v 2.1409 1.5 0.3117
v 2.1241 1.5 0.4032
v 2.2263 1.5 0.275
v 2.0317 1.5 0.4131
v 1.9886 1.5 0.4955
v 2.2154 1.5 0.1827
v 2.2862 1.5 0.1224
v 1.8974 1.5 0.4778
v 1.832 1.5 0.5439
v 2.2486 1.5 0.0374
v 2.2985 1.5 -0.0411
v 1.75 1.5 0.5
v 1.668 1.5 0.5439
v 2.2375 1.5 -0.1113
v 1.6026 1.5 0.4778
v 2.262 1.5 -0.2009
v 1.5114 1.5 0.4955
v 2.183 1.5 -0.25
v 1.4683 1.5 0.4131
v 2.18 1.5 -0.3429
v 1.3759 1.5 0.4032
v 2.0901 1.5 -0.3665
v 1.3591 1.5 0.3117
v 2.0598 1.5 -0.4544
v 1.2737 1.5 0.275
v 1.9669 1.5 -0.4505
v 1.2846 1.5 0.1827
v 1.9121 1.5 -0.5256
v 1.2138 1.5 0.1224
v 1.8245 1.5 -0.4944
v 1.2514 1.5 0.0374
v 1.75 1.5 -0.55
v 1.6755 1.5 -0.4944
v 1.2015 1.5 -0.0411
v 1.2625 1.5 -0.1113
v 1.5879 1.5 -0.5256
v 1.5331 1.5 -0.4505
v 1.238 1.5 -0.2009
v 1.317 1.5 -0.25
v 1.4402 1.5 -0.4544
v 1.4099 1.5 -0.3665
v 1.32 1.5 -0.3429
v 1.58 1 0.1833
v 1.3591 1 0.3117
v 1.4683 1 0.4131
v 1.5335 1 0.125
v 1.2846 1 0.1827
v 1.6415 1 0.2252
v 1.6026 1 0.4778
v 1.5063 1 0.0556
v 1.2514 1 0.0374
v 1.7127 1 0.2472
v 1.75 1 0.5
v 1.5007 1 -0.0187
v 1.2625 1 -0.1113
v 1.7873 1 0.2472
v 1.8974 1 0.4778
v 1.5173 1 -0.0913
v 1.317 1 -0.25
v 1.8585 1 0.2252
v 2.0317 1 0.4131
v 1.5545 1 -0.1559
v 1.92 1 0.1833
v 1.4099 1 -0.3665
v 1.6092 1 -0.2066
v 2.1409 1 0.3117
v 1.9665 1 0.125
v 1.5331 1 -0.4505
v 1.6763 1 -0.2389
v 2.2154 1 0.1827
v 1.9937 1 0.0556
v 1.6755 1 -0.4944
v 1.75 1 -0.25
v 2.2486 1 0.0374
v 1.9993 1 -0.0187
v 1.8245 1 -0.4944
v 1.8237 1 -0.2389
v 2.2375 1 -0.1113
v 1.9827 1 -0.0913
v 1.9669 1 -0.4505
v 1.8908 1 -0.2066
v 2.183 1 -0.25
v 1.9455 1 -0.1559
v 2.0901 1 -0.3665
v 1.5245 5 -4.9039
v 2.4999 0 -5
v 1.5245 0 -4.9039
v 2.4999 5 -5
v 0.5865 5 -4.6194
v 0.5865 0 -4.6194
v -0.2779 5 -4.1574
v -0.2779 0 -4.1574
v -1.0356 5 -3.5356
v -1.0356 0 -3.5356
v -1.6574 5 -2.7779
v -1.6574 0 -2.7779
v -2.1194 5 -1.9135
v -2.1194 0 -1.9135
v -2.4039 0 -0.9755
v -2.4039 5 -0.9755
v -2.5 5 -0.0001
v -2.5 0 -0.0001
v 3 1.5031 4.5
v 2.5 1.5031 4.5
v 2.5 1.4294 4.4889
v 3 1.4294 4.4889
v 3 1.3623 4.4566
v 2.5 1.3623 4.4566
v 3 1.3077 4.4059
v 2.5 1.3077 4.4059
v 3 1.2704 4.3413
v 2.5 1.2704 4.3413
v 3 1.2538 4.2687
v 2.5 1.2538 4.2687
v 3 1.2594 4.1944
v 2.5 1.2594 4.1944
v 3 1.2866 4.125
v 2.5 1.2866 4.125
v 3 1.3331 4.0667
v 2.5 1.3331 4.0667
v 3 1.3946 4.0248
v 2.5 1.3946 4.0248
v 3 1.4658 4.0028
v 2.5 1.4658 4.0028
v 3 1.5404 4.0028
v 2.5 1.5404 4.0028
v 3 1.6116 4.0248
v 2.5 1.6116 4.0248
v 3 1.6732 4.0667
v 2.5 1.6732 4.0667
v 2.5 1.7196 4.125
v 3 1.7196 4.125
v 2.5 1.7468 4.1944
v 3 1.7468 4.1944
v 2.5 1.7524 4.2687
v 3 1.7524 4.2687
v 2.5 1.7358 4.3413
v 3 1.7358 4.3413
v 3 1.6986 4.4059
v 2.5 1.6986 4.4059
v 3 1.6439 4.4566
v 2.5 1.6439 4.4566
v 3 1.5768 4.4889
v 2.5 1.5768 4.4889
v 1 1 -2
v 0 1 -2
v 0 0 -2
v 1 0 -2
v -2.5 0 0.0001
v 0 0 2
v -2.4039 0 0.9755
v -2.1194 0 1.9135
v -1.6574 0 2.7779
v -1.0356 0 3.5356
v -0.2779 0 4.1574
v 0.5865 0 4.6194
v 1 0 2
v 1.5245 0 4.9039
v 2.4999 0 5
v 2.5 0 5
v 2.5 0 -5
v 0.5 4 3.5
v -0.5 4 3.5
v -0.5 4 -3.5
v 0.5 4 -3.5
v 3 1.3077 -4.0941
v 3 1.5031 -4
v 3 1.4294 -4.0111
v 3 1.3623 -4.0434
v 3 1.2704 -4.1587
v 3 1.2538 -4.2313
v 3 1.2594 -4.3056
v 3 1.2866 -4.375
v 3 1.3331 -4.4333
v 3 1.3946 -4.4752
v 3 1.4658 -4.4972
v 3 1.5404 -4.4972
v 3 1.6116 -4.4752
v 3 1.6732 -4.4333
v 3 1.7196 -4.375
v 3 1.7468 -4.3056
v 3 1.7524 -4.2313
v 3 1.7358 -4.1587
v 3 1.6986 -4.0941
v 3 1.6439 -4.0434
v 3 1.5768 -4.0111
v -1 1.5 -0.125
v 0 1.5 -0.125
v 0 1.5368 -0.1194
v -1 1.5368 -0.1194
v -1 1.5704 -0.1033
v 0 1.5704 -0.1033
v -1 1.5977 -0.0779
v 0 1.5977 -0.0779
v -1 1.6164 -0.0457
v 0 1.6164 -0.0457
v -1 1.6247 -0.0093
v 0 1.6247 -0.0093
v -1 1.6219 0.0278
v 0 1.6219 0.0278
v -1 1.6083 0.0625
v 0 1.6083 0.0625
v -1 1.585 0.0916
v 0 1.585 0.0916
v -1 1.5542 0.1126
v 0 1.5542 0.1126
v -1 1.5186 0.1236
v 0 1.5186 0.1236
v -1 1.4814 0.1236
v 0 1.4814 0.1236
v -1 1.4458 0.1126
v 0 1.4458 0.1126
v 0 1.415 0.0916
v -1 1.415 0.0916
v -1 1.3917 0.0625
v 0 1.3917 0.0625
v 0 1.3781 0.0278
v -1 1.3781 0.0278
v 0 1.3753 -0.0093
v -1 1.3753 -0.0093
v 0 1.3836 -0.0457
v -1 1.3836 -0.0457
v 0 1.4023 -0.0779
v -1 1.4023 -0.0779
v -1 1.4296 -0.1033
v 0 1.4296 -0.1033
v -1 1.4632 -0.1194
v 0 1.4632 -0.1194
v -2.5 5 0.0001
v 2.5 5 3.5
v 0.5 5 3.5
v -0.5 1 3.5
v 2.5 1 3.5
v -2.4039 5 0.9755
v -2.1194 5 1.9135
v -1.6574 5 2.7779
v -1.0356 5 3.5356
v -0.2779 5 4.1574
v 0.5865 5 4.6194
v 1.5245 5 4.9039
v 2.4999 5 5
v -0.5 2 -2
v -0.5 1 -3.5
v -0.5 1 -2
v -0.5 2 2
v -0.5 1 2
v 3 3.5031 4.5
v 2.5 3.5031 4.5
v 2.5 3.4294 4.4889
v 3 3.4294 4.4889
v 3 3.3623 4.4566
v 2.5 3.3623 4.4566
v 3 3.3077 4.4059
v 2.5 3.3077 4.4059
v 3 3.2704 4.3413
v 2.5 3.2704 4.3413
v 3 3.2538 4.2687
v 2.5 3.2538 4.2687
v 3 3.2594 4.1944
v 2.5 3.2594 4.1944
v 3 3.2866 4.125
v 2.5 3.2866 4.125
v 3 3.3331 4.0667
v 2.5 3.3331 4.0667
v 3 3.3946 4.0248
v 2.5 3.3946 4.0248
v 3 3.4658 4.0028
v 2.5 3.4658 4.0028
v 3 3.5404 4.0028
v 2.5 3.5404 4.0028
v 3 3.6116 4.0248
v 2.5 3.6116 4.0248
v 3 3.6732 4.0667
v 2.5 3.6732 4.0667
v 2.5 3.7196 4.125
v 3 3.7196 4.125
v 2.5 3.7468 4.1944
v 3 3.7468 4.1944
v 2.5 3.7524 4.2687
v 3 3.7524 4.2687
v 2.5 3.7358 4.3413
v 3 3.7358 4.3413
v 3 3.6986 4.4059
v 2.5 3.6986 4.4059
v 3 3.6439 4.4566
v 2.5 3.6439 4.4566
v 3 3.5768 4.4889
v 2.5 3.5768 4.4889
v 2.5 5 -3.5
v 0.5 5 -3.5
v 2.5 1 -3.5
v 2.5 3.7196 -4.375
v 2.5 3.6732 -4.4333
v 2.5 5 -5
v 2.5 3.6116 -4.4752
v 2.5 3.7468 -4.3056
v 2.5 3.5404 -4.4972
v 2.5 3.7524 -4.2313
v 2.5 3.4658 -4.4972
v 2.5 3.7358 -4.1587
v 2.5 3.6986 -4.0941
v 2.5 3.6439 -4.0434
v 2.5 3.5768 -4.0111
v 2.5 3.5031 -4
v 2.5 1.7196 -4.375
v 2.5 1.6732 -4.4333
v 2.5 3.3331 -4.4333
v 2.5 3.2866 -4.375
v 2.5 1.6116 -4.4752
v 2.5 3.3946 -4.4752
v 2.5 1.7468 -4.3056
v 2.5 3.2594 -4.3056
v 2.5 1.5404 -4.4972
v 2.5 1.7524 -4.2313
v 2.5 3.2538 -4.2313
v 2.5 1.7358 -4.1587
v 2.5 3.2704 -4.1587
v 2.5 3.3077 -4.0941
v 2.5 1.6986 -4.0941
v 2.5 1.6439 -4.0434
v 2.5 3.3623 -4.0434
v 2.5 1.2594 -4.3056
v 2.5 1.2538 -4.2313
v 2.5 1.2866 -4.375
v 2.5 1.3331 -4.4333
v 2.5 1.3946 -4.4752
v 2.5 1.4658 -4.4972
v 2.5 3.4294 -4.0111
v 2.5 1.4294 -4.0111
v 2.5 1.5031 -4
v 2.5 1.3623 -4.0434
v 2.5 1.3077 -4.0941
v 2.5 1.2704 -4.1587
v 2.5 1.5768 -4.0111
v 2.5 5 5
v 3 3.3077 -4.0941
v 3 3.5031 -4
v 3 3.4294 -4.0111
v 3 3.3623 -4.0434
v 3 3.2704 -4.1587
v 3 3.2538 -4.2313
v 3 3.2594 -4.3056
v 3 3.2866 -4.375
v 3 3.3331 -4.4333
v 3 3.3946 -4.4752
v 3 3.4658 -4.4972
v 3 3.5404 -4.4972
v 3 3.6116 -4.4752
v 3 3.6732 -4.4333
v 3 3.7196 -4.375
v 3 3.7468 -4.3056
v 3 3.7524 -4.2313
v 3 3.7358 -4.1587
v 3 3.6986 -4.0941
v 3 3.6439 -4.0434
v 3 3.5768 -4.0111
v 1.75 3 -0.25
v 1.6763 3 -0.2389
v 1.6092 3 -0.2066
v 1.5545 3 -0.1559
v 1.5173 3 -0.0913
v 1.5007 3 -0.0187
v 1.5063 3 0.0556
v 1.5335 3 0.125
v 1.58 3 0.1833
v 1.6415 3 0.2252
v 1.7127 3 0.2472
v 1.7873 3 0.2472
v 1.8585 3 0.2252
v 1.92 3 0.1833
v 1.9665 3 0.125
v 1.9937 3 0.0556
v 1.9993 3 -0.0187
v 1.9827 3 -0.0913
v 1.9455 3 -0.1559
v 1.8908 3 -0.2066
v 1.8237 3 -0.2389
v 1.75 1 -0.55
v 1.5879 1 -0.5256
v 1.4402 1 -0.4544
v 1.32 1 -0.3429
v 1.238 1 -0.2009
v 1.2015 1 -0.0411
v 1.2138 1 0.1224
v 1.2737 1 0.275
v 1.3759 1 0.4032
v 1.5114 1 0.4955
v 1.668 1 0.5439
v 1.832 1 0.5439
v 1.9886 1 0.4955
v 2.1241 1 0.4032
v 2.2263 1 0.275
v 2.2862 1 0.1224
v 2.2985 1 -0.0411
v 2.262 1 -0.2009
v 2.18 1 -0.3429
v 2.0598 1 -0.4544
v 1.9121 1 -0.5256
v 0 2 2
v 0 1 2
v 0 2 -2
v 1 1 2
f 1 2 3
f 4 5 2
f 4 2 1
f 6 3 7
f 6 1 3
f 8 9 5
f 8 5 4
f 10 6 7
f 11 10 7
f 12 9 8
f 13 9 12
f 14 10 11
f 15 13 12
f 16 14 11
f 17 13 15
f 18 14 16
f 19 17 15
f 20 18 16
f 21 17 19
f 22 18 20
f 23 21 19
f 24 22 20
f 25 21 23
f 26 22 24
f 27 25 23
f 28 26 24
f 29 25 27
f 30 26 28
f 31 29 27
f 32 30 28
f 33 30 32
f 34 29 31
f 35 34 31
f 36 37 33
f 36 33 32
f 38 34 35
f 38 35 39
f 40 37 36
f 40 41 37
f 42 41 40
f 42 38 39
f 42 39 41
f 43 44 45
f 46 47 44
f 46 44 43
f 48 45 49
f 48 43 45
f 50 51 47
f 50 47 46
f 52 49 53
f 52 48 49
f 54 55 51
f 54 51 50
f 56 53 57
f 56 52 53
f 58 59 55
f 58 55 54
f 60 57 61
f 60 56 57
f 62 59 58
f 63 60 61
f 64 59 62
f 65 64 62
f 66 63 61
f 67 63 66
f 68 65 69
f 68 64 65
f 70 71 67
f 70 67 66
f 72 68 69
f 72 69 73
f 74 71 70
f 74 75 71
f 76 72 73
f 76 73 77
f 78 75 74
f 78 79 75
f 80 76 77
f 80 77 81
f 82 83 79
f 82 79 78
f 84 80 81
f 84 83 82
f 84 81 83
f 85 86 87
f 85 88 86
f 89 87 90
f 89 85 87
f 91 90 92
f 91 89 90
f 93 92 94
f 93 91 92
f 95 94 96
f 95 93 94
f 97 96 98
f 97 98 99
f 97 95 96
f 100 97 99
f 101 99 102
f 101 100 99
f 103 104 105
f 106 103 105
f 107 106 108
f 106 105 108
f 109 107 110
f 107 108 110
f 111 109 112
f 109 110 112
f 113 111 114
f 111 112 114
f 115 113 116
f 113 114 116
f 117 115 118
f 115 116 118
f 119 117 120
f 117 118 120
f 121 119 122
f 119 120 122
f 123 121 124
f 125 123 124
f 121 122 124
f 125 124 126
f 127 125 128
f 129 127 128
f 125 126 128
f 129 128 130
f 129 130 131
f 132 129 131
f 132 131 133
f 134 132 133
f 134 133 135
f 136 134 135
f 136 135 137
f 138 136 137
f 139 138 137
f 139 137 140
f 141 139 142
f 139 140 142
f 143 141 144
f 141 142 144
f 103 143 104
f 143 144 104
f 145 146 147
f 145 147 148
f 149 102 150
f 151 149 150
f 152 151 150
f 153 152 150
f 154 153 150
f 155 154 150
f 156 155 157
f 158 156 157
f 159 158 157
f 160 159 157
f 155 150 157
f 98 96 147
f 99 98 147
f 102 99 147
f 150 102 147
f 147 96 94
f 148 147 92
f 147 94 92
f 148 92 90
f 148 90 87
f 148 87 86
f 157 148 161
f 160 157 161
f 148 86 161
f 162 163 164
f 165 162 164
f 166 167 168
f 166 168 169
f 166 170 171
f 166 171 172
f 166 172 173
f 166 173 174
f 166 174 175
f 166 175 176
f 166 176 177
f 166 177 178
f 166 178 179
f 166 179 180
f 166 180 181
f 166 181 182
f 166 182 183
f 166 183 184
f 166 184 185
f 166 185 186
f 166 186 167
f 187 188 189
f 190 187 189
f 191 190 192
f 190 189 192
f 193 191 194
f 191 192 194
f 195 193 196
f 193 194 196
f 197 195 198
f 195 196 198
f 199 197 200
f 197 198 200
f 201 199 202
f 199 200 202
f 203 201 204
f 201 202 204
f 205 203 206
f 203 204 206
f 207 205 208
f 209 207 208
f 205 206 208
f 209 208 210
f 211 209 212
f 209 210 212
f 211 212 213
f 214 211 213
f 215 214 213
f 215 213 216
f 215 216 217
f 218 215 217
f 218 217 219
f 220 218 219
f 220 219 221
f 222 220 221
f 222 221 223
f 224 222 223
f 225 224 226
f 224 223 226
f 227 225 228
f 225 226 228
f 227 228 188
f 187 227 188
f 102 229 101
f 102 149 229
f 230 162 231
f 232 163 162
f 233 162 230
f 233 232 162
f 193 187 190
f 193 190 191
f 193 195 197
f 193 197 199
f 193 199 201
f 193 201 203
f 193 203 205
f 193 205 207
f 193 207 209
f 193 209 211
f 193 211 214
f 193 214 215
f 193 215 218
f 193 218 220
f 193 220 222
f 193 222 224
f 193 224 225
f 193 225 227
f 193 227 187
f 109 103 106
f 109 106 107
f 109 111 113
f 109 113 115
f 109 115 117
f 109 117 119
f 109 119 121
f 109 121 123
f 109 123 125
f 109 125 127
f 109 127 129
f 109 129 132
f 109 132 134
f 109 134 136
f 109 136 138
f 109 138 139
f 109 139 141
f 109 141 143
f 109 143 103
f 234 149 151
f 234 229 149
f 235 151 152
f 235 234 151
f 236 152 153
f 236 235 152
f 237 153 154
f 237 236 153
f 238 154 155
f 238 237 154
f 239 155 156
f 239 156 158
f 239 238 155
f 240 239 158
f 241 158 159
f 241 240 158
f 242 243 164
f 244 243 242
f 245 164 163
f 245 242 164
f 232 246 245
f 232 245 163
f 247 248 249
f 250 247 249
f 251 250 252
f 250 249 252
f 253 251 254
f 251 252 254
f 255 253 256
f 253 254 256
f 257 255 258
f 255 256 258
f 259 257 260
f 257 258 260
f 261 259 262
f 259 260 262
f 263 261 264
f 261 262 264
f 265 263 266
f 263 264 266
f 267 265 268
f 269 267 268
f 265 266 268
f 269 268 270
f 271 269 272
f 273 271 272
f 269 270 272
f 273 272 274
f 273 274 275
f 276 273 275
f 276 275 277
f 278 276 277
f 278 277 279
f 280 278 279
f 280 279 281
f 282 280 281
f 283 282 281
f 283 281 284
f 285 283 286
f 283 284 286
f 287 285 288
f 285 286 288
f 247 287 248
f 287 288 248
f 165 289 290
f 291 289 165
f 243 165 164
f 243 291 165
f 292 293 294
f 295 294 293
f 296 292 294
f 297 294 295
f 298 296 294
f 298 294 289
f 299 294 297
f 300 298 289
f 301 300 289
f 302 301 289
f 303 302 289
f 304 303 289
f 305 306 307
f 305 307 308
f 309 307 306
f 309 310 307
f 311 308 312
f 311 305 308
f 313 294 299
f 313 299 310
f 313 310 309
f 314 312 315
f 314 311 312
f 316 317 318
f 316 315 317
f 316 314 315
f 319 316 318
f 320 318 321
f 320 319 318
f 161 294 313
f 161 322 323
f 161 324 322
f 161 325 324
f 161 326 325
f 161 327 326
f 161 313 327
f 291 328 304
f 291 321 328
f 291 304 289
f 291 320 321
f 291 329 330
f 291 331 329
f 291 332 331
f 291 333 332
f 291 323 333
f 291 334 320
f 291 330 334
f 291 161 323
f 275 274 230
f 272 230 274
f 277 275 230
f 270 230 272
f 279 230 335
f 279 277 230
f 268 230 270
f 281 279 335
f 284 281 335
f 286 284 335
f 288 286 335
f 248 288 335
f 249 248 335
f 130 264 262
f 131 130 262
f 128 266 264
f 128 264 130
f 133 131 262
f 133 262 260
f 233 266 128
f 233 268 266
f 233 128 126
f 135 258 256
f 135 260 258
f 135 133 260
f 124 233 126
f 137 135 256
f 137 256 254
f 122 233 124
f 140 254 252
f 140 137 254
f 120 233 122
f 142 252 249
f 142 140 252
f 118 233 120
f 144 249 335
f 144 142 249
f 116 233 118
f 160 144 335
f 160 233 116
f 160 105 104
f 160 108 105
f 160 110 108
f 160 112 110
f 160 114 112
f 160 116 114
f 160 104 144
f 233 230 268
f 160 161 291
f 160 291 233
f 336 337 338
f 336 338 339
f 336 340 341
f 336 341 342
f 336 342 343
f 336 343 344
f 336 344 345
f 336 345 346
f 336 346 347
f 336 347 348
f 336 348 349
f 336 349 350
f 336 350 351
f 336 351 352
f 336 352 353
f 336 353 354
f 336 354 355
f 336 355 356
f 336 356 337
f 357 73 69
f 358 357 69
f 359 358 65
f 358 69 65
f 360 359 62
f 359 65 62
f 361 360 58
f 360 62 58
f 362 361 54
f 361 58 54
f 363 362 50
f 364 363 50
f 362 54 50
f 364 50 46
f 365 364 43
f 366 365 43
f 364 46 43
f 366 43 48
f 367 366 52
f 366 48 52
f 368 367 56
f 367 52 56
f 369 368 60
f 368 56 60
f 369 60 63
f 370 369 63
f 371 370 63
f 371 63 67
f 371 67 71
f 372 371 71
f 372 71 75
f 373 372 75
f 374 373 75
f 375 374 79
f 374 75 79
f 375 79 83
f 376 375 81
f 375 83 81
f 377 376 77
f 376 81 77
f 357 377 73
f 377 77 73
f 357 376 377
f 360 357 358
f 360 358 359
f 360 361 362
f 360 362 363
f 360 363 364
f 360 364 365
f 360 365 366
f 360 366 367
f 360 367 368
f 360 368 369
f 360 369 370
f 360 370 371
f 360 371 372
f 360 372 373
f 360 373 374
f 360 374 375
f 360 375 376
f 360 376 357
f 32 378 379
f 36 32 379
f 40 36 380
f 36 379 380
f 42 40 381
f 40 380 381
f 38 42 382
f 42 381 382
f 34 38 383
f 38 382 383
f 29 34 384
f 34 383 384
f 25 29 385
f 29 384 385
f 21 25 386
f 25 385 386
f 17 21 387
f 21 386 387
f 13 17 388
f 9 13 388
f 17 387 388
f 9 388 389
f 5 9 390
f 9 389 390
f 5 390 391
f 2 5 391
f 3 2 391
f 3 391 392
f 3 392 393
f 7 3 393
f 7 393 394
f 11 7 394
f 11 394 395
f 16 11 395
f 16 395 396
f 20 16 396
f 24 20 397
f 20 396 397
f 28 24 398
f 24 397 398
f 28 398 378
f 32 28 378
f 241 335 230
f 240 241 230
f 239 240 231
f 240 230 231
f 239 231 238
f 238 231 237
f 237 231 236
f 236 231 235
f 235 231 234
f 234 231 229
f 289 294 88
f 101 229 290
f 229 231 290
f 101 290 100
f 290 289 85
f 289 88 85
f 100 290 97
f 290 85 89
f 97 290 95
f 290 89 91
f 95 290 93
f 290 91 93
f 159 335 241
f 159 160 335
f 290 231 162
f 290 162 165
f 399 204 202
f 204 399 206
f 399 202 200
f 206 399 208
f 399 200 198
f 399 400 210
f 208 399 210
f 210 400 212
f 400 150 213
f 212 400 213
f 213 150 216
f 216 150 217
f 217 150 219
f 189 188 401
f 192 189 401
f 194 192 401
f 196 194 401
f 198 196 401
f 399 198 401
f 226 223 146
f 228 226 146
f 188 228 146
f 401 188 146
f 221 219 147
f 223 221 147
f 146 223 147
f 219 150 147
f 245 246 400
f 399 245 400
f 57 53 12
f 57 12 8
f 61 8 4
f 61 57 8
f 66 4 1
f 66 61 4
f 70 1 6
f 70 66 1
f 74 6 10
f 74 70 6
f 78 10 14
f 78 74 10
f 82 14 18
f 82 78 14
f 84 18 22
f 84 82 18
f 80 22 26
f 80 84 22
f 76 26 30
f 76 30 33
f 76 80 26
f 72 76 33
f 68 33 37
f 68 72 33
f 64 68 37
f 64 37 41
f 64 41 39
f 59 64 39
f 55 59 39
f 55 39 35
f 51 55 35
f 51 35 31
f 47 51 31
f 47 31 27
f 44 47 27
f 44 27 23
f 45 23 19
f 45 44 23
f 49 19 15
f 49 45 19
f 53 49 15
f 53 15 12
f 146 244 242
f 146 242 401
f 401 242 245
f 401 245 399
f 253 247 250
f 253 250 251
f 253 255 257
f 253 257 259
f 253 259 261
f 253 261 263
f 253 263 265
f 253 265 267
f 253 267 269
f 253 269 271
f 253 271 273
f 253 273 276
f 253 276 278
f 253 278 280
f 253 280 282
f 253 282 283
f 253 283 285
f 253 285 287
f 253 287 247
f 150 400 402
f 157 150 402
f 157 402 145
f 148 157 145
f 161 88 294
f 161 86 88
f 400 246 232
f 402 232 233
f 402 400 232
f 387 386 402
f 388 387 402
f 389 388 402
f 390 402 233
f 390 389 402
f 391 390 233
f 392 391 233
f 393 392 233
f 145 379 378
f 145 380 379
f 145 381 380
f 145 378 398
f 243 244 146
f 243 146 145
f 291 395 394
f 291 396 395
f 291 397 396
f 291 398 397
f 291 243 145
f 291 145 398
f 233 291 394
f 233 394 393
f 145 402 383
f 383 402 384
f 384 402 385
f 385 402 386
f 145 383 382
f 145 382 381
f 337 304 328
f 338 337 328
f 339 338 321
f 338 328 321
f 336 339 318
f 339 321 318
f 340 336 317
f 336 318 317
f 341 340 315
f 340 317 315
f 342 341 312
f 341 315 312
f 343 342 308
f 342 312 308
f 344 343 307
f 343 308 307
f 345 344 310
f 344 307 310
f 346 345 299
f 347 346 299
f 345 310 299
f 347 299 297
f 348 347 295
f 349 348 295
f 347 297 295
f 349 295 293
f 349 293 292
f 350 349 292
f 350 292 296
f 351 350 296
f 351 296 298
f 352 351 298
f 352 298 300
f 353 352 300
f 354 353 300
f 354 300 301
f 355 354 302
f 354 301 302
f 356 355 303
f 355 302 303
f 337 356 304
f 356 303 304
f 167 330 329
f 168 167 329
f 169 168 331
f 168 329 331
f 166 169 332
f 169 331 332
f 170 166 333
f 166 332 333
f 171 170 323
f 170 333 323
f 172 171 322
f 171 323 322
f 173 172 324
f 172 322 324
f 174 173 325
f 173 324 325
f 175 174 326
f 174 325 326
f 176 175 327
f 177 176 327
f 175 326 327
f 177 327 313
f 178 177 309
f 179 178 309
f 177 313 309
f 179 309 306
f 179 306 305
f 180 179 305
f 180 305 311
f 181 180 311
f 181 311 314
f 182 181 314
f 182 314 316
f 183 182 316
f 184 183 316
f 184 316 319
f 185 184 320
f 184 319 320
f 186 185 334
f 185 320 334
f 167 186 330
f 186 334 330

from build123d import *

# Parameters (mm, degrees)
SZKIC1_W                     = 5
SZKIC1_H                     = 10
DODANIE_WYCI_GNI_CIE1_DEPTH  = 1
DODANIE_WYCI_GNI_CIE4_DEPTH  = 4
ZAOKR_GLENIE2_R              = 5
SZKIC3_W                     = 1
SZKIC3_H                     = 4
WYTNIJ_WYCI_GNI_CIE1_DEPTH   = 4
SZKIC4_W                     = 0.5
SZKIC4_H                     = 4
DODANIE_WYCI_GNI_CIE5_DEPTH  = 1
SZKIC5_R                     = 0.25
DODANIE_WYCI_GNI_CIE6_DEPTH  = 2
SZKIC6_R                     = 0.55
SZKIC6_R_2                   = 0.5
DODANIE_WYCI_GNI_CIE7_DEPTH  = 0.5
SZKIC7_W                     = 7
SZKIC7_H                     = 1
DODANIE_WYCI_GNI_CIE8_DEPTH  = 1
SZKIC11_R                    = 0.25
DODANIE_WYCI_GNI_CIE10_DEPTH = 0.5
SZKIC12_R                    = 0.125
WYTNIJ_WYCI_GNI_CIE2_DEPTH   = 1


with BuildPart() as part:
    # Szkic1 → Dodanie-wyciągnięcie1 (new body)
    with BuildSketch(Plane(origin=(0, 0, 0), x_dir=(1, 0, 0), z_dir=(0, 1, 0))):
        Rectangle(SZKIC1_W, SZKIC1_H)
    extrude(amount=DODANIE_WYCI_GNI_CIE1_DEPTH)

    # Szkic2 → Dodanie-wyciągnięcie4 (add)
    with BuildSketch(Plane(origin=(0, 1, 0), x_dir=(1, 0, 0), z_dir=(0, 1, 0))):
        Polygon((-2.5, 5), (2.5, 5), (2.5, 3.5), (-0.5, 3.5), (-0.5, -3.5), (2.5, -3.5), (2.5, -5), (-2.5, -5), align=None)
    extrude(amount=DODANIE_WYCI_GNI_CIE4_DEPTH)

    # Zaokrąglenie2
    zaokr_glenie2_edges = [part.edges().sort_by_distance(p)[0] for p in [
        (-2.5, 2.5, -5),
        (-2.5, 2.5, 5),
    ]]
    fillet(zaokr_glenie2_edges, radius=ZAOKR_GLENIE2_R - 0.0001)  # a hair under: the kernel refuses the full size

    # Szkic3 → Wytnij-wyciągnięcie1 (cut)
    with BuildSketch(Plane(origin=(0, 1, 0), x_dir=(1, 0, 0), z_dir=(0, 1, 0))):
        with Locations((0.5, 0)):
            Rectangle(SZKIC3_W, SZKIC3_H)
    extrude(amount=-WYTNIJ_WYCI_GNI_CIE1_DEPTH, mode=Mode.SUBTRACT)

    # Szkic4 → Dodanie-wyciągnięcie5 (add)
    with BuildSketch(Plane(origin=(0, 1, 0), x_dir=(1, 0, 0), z_dir=(0, 1, 0))):
        with Locations((-0.25, 0)):
            Rectangle(SZKIC4_W, SZKIC4_H)
    extrude(amount=DODANIE_WYCI_GNI_CIE5_DEPTH)

    # Szkic5 → Dodanie-wyciągnięcie6 (add)
    with BuildSketch(Plane(origin=(0, 1, 0), x_dir=(1, 0, 0), z_dir=(0, 1, 0))):
        with Locations(Location((1.75, 0, 0), (0, 0, 90))):
            Circle(SZKIC5_R)
    extrude(amount=DODANIE_WYCI_GNI_CIE6_DEPTH)

    # Szkic6 → Dodanie-wyciągnięcie7 (add)
    with BuildSketch(Plane(origin=(0, 1, 0), x_dir=(1, 0, 0), z_dir=(0, 1, 0))):
        with Locations(Location((1.75, 0, 0), (0, 0, 90))):
            Circle(SZKIC6_R)
        with Locations(Location((1.75, 0, 0), (0, 0, 270))):
            Circle(SZKIC6_R_2, mode=Mode.SUBTRACT)
    extrude(amount=DODANIE_WYCI_GNI_CIE7_DEPTH)

    # Szkic7 → Dodanie-wyciągnięcie8 (add)
    with BuildSketch(Plane(origin=(-0.5, 0, 0), x_dir=(0, 0, -1), z_dir=(1, 0, 0))):
        with Locations((0, 4.5)):
            Rectangle(SZKIC7_W, SZKIC7_H)
    extrude(amount=DODANIE_WYCI_GNI_CIE8_DEPTH)

    # Szkic11 → Dodanie-wyciągnięcie10 (add)
    with BuildSketch(Plane(origin=(2.5, 0, 0), x_dir=(0, 0, -1), z_dir=(1, 0, 0))):
        with Locations(Location((-4.25, 3.503110499, 0), (0, 0, 180))):
            Circle(SZKIC11_R)
        with Locations(Location((-4.25, 1.503110499, 0), (0, 0, 180))):
            Circle(SZKIC11_R)
        with Locations(Location((4.25, 3.503110499, 0), (0, 0, 180))):
            Circle(SZKIC11_R)
        with Locations(Location((4.25, 1.503110499, 0), (0, 0, 180))):
            Circle(SZKIC11_R)
    extrude(amount=DODANIE_WYCI_GNI_CIE10_DEPTH)

    # Szkic12 → Wytnij-wyciągnięcie2 (cut)
    with BuildSketch(Plane(origin=(0, 0, 0), x_dir=(0, 0, -1), z_dir=(1, 0, 0))):
        with Locations((0, 1.5)):
            Circle(SZKIC12_R)
    extrude(amount=-WYTNIJ_WYCI_GNI_CIE2_DEPTH, mode=Mode.SUBTRACT)


solid = part.part
